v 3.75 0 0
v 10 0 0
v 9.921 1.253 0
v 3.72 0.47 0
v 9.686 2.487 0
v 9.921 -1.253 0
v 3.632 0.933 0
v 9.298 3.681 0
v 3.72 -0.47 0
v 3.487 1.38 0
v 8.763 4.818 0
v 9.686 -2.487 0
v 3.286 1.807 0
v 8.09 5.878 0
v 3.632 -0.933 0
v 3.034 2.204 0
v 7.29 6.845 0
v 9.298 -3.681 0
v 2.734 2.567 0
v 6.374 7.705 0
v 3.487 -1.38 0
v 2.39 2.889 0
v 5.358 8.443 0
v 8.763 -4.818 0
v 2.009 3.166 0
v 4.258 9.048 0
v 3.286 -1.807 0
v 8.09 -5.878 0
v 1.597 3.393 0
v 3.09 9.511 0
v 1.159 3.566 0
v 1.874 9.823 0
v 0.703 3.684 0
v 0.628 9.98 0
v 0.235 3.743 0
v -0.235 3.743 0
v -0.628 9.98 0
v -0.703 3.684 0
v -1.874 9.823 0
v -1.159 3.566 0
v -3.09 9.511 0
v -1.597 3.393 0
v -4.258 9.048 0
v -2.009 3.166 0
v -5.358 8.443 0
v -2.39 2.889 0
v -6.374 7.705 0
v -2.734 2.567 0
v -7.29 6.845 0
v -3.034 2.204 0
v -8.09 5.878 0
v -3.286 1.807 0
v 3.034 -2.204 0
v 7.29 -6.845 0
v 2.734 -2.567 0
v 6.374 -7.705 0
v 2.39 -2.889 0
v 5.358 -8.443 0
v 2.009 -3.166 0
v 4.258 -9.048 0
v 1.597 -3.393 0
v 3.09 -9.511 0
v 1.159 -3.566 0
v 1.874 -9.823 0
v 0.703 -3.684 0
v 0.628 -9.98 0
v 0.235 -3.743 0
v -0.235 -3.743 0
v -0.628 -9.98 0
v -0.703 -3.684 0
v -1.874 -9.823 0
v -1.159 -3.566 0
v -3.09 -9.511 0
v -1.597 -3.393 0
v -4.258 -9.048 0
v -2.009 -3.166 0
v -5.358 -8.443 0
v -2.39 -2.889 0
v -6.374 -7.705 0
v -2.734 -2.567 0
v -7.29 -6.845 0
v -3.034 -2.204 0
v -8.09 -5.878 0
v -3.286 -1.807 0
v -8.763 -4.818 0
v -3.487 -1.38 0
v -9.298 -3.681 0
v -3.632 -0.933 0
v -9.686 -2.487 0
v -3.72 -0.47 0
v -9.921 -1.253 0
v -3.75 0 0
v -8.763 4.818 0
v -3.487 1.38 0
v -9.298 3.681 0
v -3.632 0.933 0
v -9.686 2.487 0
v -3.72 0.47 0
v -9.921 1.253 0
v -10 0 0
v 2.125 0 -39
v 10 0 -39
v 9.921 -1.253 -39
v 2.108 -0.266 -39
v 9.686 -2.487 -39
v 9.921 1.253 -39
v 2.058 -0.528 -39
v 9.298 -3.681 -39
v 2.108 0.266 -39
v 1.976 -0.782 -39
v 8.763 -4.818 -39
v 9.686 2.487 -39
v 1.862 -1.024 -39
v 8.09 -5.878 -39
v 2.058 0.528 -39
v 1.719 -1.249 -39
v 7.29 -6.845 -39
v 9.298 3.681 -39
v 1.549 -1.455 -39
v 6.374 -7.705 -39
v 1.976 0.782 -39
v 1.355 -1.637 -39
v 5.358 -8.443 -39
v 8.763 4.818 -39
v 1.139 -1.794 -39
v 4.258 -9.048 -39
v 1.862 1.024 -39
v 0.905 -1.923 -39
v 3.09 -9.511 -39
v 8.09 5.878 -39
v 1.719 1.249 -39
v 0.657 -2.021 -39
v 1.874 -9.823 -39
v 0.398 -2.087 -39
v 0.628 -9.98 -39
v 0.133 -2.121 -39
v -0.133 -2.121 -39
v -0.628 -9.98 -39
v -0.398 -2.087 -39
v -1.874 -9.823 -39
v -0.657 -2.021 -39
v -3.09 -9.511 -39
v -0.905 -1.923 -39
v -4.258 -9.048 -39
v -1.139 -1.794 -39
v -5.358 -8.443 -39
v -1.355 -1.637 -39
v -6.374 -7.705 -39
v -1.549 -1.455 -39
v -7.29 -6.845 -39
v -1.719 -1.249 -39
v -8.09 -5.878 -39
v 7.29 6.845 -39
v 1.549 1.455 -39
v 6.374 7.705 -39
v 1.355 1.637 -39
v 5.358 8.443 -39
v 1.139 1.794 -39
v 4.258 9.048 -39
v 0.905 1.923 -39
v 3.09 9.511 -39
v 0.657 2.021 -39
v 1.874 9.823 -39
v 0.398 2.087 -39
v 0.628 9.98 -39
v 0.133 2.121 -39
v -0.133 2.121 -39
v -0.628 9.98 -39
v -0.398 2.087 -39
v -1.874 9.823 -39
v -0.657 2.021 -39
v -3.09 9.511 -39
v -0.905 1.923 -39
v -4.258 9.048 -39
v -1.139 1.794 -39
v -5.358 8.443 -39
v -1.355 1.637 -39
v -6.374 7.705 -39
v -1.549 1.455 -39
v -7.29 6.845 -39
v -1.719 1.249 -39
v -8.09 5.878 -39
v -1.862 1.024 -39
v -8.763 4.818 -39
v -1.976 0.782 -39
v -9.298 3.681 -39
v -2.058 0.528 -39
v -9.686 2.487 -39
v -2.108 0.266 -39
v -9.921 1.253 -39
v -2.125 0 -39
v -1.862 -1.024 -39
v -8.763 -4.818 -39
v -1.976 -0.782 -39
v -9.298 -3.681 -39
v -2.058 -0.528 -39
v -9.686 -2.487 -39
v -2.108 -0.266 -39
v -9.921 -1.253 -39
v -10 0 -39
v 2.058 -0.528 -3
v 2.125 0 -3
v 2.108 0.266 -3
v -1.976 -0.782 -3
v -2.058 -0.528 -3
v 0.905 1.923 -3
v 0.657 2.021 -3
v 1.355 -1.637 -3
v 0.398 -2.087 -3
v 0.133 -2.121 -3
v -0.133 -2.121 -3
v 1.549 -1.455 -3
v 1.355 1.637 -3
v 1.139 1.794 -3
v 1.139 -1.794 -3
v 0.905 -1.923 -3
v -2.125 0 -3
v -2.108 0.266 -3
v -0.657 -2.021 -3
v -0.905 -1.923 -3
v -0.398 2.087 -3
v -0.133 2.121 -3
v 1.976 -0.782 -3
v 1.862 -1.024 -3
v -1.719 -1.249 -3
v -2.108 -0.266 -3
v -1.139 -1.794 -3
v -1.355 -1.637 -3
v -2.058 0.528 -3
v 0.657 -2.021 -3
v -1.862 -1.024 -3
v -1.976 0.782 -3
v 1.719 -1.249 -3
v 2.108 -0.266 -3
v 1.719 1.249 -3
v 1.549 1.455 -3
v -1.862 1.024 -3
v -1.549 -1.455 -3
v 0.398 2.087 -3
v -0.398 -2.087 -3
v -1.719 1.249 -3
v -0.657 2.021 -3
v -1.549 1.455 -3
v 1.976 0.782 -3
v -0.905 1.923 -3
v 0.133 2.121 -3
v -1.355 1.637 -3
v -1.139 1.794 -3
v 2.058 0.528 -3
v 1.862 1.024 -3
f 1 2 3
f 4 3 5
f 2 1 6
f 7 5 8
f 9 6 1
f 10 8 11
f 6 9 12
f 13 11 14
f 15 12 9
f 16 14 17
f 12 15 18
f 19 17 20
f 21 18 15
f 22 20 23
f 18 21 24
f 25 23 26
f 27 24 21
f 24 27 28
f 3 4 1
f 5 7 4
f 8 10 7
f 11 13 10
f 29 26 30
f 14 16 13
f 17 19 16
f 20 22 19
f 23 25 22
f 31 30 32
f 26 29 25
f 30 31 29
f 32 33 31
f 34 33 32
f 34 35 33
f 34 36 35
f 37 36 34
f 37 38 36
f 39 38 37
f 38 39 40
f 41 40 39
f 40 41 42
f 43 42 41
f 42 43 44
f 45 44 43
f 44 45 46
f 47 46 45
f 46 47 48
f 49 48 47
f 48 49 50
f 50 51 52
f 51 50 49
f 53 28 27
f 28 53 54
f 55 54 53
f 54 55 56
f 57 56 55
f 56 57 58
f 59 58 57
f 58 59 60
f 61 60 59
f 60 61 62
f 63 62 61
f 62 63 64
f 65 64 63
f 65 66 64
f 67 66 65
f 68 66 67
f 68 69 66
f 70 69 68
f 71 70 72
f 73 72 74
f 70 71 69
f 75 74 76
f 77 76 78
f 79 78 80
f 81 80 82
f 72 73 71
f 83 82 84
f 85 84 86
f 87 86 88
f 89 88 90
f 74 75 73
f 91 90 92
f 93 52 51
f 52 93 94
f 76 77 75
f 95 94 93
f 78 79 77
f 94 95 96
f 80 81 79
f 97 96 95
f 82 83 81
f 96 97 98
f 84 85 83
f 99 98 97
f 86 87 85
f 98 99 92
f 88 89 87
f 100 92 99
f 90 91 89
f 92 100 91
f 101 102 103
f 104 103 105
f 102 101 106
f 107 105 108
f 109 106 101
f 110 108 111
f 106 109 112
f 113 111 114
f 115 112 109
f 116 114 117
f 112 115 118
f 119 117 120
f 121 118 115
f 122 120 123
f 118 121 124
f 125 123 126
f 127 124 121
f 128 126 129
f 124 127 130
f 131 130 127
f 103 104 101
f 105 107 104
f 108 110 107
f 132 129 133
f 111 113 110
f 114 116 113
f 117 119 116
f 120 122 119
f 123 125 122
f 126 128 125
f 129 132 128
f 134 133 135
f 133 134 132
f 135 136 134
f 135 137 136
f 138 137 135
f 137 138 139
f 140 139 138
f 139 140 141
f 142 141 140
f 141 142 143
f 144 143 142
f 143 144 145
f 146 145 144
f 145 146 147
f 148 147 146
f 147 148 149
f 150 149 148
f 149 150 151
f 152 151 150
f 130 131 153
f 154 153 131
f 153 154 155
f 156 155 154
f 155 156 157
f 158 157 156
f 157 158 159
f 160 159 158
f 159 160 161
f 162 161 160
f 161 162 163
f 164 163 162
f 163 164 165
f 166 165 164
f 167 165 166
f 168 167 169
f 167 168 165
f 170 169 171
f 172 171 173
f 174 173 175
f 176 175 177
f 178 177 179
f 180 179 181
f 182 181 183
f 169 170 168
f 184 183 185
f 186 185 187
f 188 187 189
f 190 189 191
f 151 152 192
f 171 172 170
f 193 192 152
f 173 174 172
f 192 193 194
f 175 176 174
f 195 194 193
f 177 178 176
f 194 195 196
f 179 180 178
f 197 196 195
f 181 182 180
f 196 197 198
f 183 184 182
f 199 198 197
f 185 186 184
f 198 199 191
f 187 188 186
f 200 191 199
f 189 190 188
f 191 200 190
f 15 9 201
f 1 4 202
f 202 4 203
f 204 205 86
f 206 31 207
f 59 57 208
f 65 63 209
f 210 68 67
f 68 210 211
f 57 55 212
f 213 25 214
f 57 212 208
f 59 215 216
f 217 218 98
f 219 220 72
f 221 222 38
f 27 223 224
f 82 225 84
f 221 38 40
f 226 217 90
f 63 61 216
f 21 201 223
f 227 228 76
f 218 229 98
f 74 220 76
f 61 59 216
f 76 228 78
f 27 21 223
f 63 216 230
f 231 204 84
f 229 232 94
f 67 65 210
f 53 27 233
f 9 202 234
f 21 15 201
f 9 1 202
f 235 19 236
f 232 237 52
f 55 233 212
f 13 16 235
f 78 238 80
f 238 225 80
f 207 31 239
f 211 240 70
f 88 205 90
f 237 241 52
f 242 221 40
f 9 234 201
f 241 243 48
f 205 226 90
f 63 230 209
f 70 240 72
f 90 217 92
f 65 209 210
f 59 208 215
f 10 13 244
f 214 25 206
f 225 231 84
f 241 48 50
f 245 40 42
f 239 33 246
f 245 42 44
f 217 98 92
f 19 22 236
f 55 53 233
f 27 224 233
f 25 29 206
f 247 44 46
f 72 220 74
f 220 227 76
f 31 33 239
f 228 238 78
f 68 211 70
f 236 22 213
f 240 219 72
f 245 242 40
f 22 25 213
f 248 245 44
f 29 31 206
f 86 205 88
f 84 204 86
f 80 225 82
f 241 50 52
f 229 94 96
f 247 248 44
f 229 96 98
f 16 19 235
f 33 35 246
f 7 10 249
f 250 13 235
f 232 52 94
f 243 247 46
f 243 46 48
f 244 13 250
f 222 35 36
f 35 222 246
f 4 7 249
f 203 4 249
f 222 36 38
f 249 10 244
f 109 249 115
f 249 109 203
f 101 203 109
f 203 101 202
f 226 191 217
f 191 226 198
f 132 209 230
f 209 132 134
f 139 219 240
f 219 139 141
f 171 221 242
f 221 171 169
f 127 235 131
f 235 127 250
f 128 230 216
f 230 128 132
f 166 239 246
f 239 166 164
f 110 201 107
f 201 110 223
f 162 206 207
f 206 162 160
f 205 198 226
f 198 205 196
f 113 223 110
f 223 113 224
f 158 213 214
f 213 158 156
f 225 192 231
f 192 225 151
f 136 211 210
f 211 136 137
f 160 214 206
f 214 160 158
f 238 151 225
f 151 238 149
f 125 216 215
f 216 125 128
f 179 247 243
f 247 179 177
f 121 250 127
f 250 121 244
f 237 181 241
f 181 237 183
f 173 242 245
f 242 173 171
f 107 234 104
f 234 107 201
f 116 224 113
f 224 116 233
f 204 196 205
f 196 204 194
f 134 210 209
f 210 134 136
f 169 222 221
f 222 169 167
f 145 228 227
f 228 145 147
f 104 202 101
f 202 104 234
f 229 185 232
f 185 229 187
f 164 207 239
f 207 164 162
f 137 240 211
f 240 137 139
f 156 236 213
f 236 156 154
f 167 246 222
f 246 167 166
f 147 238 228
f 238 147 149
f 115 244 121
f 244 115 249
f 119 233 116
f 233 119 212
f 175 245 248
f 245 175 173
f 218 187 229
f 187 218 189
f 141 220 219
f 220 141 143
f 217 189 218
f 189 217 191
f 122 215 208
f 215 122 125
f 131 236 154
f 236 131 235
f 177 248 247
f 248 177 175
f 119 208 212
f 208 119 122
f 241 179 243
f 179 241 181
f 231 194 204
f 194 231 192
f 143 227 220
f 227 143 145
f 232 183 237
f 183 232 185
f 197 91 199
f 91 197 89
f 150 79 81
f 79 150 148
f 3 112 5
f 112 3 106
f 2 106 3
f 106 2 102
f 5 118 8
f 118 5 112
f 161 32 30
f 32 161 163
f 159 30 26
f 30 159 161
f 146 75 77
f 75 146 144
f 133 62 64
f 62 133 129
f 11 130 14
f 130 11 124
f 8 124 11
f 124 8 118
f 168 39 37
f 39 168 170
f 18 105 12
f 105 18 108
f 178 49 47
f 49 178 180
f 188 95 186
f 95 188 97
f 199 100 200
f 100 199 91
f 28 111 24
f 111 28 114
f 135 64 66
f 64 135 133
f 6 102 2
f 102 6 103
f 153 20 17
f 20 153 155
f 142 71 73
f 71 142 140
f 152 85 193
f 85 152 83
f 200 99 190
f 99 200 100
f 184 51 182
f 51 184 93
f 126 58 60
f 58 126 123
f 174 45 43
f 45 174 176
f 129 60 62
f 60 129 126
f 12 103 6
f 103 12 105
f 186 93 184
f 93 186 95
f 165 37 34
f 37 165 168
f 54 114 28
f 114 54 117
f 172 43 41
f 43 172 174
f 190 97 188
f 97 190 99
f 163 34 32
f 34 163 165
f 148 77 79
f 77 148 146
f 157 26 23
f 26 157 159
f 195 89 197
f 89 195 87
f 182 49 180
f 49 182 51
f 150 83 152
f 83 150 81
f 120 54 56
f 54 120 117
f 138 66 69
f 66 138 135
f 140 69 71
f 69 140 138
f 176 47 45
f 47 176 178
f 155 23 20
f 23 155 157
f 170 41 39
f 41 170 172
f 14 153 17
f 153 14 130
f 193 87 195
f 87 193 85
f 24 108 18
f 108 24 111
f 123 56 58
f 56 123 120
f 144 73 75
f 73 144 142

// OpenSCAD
$fn = 50;


difference() {
	union() {
		translate(v = [0, 0, -39.0000000000]) {
			cylinder(h = 39, r = 10.0000000000);
		}
	}
	union() {
		translate(v = [0, 0, 0]) {
			rotate(a = [0, 0, 0]) {
				difference() {
					union() {
						#translate(v = [0, 0, -39.0000000000]) {
							cylinder(h = 39, r = 2.0000000000);
						}
						#translate(v = [0, 0, -3]) {
							cylinder(h = 3, r1 = 2.1250000000, r2 = 3.7500000000);
						}
						#translate(v = [0, 0, -39.0000000000]) {
							cylinder(h = 39, r = 2.1250000000);
						}
						#translate(v = [0, 0, -39.0000000000]) {
							cylinder(h = 39, r = 2.0000000000);
						}
					}
					union();
				}
			}
		}
	}
}
